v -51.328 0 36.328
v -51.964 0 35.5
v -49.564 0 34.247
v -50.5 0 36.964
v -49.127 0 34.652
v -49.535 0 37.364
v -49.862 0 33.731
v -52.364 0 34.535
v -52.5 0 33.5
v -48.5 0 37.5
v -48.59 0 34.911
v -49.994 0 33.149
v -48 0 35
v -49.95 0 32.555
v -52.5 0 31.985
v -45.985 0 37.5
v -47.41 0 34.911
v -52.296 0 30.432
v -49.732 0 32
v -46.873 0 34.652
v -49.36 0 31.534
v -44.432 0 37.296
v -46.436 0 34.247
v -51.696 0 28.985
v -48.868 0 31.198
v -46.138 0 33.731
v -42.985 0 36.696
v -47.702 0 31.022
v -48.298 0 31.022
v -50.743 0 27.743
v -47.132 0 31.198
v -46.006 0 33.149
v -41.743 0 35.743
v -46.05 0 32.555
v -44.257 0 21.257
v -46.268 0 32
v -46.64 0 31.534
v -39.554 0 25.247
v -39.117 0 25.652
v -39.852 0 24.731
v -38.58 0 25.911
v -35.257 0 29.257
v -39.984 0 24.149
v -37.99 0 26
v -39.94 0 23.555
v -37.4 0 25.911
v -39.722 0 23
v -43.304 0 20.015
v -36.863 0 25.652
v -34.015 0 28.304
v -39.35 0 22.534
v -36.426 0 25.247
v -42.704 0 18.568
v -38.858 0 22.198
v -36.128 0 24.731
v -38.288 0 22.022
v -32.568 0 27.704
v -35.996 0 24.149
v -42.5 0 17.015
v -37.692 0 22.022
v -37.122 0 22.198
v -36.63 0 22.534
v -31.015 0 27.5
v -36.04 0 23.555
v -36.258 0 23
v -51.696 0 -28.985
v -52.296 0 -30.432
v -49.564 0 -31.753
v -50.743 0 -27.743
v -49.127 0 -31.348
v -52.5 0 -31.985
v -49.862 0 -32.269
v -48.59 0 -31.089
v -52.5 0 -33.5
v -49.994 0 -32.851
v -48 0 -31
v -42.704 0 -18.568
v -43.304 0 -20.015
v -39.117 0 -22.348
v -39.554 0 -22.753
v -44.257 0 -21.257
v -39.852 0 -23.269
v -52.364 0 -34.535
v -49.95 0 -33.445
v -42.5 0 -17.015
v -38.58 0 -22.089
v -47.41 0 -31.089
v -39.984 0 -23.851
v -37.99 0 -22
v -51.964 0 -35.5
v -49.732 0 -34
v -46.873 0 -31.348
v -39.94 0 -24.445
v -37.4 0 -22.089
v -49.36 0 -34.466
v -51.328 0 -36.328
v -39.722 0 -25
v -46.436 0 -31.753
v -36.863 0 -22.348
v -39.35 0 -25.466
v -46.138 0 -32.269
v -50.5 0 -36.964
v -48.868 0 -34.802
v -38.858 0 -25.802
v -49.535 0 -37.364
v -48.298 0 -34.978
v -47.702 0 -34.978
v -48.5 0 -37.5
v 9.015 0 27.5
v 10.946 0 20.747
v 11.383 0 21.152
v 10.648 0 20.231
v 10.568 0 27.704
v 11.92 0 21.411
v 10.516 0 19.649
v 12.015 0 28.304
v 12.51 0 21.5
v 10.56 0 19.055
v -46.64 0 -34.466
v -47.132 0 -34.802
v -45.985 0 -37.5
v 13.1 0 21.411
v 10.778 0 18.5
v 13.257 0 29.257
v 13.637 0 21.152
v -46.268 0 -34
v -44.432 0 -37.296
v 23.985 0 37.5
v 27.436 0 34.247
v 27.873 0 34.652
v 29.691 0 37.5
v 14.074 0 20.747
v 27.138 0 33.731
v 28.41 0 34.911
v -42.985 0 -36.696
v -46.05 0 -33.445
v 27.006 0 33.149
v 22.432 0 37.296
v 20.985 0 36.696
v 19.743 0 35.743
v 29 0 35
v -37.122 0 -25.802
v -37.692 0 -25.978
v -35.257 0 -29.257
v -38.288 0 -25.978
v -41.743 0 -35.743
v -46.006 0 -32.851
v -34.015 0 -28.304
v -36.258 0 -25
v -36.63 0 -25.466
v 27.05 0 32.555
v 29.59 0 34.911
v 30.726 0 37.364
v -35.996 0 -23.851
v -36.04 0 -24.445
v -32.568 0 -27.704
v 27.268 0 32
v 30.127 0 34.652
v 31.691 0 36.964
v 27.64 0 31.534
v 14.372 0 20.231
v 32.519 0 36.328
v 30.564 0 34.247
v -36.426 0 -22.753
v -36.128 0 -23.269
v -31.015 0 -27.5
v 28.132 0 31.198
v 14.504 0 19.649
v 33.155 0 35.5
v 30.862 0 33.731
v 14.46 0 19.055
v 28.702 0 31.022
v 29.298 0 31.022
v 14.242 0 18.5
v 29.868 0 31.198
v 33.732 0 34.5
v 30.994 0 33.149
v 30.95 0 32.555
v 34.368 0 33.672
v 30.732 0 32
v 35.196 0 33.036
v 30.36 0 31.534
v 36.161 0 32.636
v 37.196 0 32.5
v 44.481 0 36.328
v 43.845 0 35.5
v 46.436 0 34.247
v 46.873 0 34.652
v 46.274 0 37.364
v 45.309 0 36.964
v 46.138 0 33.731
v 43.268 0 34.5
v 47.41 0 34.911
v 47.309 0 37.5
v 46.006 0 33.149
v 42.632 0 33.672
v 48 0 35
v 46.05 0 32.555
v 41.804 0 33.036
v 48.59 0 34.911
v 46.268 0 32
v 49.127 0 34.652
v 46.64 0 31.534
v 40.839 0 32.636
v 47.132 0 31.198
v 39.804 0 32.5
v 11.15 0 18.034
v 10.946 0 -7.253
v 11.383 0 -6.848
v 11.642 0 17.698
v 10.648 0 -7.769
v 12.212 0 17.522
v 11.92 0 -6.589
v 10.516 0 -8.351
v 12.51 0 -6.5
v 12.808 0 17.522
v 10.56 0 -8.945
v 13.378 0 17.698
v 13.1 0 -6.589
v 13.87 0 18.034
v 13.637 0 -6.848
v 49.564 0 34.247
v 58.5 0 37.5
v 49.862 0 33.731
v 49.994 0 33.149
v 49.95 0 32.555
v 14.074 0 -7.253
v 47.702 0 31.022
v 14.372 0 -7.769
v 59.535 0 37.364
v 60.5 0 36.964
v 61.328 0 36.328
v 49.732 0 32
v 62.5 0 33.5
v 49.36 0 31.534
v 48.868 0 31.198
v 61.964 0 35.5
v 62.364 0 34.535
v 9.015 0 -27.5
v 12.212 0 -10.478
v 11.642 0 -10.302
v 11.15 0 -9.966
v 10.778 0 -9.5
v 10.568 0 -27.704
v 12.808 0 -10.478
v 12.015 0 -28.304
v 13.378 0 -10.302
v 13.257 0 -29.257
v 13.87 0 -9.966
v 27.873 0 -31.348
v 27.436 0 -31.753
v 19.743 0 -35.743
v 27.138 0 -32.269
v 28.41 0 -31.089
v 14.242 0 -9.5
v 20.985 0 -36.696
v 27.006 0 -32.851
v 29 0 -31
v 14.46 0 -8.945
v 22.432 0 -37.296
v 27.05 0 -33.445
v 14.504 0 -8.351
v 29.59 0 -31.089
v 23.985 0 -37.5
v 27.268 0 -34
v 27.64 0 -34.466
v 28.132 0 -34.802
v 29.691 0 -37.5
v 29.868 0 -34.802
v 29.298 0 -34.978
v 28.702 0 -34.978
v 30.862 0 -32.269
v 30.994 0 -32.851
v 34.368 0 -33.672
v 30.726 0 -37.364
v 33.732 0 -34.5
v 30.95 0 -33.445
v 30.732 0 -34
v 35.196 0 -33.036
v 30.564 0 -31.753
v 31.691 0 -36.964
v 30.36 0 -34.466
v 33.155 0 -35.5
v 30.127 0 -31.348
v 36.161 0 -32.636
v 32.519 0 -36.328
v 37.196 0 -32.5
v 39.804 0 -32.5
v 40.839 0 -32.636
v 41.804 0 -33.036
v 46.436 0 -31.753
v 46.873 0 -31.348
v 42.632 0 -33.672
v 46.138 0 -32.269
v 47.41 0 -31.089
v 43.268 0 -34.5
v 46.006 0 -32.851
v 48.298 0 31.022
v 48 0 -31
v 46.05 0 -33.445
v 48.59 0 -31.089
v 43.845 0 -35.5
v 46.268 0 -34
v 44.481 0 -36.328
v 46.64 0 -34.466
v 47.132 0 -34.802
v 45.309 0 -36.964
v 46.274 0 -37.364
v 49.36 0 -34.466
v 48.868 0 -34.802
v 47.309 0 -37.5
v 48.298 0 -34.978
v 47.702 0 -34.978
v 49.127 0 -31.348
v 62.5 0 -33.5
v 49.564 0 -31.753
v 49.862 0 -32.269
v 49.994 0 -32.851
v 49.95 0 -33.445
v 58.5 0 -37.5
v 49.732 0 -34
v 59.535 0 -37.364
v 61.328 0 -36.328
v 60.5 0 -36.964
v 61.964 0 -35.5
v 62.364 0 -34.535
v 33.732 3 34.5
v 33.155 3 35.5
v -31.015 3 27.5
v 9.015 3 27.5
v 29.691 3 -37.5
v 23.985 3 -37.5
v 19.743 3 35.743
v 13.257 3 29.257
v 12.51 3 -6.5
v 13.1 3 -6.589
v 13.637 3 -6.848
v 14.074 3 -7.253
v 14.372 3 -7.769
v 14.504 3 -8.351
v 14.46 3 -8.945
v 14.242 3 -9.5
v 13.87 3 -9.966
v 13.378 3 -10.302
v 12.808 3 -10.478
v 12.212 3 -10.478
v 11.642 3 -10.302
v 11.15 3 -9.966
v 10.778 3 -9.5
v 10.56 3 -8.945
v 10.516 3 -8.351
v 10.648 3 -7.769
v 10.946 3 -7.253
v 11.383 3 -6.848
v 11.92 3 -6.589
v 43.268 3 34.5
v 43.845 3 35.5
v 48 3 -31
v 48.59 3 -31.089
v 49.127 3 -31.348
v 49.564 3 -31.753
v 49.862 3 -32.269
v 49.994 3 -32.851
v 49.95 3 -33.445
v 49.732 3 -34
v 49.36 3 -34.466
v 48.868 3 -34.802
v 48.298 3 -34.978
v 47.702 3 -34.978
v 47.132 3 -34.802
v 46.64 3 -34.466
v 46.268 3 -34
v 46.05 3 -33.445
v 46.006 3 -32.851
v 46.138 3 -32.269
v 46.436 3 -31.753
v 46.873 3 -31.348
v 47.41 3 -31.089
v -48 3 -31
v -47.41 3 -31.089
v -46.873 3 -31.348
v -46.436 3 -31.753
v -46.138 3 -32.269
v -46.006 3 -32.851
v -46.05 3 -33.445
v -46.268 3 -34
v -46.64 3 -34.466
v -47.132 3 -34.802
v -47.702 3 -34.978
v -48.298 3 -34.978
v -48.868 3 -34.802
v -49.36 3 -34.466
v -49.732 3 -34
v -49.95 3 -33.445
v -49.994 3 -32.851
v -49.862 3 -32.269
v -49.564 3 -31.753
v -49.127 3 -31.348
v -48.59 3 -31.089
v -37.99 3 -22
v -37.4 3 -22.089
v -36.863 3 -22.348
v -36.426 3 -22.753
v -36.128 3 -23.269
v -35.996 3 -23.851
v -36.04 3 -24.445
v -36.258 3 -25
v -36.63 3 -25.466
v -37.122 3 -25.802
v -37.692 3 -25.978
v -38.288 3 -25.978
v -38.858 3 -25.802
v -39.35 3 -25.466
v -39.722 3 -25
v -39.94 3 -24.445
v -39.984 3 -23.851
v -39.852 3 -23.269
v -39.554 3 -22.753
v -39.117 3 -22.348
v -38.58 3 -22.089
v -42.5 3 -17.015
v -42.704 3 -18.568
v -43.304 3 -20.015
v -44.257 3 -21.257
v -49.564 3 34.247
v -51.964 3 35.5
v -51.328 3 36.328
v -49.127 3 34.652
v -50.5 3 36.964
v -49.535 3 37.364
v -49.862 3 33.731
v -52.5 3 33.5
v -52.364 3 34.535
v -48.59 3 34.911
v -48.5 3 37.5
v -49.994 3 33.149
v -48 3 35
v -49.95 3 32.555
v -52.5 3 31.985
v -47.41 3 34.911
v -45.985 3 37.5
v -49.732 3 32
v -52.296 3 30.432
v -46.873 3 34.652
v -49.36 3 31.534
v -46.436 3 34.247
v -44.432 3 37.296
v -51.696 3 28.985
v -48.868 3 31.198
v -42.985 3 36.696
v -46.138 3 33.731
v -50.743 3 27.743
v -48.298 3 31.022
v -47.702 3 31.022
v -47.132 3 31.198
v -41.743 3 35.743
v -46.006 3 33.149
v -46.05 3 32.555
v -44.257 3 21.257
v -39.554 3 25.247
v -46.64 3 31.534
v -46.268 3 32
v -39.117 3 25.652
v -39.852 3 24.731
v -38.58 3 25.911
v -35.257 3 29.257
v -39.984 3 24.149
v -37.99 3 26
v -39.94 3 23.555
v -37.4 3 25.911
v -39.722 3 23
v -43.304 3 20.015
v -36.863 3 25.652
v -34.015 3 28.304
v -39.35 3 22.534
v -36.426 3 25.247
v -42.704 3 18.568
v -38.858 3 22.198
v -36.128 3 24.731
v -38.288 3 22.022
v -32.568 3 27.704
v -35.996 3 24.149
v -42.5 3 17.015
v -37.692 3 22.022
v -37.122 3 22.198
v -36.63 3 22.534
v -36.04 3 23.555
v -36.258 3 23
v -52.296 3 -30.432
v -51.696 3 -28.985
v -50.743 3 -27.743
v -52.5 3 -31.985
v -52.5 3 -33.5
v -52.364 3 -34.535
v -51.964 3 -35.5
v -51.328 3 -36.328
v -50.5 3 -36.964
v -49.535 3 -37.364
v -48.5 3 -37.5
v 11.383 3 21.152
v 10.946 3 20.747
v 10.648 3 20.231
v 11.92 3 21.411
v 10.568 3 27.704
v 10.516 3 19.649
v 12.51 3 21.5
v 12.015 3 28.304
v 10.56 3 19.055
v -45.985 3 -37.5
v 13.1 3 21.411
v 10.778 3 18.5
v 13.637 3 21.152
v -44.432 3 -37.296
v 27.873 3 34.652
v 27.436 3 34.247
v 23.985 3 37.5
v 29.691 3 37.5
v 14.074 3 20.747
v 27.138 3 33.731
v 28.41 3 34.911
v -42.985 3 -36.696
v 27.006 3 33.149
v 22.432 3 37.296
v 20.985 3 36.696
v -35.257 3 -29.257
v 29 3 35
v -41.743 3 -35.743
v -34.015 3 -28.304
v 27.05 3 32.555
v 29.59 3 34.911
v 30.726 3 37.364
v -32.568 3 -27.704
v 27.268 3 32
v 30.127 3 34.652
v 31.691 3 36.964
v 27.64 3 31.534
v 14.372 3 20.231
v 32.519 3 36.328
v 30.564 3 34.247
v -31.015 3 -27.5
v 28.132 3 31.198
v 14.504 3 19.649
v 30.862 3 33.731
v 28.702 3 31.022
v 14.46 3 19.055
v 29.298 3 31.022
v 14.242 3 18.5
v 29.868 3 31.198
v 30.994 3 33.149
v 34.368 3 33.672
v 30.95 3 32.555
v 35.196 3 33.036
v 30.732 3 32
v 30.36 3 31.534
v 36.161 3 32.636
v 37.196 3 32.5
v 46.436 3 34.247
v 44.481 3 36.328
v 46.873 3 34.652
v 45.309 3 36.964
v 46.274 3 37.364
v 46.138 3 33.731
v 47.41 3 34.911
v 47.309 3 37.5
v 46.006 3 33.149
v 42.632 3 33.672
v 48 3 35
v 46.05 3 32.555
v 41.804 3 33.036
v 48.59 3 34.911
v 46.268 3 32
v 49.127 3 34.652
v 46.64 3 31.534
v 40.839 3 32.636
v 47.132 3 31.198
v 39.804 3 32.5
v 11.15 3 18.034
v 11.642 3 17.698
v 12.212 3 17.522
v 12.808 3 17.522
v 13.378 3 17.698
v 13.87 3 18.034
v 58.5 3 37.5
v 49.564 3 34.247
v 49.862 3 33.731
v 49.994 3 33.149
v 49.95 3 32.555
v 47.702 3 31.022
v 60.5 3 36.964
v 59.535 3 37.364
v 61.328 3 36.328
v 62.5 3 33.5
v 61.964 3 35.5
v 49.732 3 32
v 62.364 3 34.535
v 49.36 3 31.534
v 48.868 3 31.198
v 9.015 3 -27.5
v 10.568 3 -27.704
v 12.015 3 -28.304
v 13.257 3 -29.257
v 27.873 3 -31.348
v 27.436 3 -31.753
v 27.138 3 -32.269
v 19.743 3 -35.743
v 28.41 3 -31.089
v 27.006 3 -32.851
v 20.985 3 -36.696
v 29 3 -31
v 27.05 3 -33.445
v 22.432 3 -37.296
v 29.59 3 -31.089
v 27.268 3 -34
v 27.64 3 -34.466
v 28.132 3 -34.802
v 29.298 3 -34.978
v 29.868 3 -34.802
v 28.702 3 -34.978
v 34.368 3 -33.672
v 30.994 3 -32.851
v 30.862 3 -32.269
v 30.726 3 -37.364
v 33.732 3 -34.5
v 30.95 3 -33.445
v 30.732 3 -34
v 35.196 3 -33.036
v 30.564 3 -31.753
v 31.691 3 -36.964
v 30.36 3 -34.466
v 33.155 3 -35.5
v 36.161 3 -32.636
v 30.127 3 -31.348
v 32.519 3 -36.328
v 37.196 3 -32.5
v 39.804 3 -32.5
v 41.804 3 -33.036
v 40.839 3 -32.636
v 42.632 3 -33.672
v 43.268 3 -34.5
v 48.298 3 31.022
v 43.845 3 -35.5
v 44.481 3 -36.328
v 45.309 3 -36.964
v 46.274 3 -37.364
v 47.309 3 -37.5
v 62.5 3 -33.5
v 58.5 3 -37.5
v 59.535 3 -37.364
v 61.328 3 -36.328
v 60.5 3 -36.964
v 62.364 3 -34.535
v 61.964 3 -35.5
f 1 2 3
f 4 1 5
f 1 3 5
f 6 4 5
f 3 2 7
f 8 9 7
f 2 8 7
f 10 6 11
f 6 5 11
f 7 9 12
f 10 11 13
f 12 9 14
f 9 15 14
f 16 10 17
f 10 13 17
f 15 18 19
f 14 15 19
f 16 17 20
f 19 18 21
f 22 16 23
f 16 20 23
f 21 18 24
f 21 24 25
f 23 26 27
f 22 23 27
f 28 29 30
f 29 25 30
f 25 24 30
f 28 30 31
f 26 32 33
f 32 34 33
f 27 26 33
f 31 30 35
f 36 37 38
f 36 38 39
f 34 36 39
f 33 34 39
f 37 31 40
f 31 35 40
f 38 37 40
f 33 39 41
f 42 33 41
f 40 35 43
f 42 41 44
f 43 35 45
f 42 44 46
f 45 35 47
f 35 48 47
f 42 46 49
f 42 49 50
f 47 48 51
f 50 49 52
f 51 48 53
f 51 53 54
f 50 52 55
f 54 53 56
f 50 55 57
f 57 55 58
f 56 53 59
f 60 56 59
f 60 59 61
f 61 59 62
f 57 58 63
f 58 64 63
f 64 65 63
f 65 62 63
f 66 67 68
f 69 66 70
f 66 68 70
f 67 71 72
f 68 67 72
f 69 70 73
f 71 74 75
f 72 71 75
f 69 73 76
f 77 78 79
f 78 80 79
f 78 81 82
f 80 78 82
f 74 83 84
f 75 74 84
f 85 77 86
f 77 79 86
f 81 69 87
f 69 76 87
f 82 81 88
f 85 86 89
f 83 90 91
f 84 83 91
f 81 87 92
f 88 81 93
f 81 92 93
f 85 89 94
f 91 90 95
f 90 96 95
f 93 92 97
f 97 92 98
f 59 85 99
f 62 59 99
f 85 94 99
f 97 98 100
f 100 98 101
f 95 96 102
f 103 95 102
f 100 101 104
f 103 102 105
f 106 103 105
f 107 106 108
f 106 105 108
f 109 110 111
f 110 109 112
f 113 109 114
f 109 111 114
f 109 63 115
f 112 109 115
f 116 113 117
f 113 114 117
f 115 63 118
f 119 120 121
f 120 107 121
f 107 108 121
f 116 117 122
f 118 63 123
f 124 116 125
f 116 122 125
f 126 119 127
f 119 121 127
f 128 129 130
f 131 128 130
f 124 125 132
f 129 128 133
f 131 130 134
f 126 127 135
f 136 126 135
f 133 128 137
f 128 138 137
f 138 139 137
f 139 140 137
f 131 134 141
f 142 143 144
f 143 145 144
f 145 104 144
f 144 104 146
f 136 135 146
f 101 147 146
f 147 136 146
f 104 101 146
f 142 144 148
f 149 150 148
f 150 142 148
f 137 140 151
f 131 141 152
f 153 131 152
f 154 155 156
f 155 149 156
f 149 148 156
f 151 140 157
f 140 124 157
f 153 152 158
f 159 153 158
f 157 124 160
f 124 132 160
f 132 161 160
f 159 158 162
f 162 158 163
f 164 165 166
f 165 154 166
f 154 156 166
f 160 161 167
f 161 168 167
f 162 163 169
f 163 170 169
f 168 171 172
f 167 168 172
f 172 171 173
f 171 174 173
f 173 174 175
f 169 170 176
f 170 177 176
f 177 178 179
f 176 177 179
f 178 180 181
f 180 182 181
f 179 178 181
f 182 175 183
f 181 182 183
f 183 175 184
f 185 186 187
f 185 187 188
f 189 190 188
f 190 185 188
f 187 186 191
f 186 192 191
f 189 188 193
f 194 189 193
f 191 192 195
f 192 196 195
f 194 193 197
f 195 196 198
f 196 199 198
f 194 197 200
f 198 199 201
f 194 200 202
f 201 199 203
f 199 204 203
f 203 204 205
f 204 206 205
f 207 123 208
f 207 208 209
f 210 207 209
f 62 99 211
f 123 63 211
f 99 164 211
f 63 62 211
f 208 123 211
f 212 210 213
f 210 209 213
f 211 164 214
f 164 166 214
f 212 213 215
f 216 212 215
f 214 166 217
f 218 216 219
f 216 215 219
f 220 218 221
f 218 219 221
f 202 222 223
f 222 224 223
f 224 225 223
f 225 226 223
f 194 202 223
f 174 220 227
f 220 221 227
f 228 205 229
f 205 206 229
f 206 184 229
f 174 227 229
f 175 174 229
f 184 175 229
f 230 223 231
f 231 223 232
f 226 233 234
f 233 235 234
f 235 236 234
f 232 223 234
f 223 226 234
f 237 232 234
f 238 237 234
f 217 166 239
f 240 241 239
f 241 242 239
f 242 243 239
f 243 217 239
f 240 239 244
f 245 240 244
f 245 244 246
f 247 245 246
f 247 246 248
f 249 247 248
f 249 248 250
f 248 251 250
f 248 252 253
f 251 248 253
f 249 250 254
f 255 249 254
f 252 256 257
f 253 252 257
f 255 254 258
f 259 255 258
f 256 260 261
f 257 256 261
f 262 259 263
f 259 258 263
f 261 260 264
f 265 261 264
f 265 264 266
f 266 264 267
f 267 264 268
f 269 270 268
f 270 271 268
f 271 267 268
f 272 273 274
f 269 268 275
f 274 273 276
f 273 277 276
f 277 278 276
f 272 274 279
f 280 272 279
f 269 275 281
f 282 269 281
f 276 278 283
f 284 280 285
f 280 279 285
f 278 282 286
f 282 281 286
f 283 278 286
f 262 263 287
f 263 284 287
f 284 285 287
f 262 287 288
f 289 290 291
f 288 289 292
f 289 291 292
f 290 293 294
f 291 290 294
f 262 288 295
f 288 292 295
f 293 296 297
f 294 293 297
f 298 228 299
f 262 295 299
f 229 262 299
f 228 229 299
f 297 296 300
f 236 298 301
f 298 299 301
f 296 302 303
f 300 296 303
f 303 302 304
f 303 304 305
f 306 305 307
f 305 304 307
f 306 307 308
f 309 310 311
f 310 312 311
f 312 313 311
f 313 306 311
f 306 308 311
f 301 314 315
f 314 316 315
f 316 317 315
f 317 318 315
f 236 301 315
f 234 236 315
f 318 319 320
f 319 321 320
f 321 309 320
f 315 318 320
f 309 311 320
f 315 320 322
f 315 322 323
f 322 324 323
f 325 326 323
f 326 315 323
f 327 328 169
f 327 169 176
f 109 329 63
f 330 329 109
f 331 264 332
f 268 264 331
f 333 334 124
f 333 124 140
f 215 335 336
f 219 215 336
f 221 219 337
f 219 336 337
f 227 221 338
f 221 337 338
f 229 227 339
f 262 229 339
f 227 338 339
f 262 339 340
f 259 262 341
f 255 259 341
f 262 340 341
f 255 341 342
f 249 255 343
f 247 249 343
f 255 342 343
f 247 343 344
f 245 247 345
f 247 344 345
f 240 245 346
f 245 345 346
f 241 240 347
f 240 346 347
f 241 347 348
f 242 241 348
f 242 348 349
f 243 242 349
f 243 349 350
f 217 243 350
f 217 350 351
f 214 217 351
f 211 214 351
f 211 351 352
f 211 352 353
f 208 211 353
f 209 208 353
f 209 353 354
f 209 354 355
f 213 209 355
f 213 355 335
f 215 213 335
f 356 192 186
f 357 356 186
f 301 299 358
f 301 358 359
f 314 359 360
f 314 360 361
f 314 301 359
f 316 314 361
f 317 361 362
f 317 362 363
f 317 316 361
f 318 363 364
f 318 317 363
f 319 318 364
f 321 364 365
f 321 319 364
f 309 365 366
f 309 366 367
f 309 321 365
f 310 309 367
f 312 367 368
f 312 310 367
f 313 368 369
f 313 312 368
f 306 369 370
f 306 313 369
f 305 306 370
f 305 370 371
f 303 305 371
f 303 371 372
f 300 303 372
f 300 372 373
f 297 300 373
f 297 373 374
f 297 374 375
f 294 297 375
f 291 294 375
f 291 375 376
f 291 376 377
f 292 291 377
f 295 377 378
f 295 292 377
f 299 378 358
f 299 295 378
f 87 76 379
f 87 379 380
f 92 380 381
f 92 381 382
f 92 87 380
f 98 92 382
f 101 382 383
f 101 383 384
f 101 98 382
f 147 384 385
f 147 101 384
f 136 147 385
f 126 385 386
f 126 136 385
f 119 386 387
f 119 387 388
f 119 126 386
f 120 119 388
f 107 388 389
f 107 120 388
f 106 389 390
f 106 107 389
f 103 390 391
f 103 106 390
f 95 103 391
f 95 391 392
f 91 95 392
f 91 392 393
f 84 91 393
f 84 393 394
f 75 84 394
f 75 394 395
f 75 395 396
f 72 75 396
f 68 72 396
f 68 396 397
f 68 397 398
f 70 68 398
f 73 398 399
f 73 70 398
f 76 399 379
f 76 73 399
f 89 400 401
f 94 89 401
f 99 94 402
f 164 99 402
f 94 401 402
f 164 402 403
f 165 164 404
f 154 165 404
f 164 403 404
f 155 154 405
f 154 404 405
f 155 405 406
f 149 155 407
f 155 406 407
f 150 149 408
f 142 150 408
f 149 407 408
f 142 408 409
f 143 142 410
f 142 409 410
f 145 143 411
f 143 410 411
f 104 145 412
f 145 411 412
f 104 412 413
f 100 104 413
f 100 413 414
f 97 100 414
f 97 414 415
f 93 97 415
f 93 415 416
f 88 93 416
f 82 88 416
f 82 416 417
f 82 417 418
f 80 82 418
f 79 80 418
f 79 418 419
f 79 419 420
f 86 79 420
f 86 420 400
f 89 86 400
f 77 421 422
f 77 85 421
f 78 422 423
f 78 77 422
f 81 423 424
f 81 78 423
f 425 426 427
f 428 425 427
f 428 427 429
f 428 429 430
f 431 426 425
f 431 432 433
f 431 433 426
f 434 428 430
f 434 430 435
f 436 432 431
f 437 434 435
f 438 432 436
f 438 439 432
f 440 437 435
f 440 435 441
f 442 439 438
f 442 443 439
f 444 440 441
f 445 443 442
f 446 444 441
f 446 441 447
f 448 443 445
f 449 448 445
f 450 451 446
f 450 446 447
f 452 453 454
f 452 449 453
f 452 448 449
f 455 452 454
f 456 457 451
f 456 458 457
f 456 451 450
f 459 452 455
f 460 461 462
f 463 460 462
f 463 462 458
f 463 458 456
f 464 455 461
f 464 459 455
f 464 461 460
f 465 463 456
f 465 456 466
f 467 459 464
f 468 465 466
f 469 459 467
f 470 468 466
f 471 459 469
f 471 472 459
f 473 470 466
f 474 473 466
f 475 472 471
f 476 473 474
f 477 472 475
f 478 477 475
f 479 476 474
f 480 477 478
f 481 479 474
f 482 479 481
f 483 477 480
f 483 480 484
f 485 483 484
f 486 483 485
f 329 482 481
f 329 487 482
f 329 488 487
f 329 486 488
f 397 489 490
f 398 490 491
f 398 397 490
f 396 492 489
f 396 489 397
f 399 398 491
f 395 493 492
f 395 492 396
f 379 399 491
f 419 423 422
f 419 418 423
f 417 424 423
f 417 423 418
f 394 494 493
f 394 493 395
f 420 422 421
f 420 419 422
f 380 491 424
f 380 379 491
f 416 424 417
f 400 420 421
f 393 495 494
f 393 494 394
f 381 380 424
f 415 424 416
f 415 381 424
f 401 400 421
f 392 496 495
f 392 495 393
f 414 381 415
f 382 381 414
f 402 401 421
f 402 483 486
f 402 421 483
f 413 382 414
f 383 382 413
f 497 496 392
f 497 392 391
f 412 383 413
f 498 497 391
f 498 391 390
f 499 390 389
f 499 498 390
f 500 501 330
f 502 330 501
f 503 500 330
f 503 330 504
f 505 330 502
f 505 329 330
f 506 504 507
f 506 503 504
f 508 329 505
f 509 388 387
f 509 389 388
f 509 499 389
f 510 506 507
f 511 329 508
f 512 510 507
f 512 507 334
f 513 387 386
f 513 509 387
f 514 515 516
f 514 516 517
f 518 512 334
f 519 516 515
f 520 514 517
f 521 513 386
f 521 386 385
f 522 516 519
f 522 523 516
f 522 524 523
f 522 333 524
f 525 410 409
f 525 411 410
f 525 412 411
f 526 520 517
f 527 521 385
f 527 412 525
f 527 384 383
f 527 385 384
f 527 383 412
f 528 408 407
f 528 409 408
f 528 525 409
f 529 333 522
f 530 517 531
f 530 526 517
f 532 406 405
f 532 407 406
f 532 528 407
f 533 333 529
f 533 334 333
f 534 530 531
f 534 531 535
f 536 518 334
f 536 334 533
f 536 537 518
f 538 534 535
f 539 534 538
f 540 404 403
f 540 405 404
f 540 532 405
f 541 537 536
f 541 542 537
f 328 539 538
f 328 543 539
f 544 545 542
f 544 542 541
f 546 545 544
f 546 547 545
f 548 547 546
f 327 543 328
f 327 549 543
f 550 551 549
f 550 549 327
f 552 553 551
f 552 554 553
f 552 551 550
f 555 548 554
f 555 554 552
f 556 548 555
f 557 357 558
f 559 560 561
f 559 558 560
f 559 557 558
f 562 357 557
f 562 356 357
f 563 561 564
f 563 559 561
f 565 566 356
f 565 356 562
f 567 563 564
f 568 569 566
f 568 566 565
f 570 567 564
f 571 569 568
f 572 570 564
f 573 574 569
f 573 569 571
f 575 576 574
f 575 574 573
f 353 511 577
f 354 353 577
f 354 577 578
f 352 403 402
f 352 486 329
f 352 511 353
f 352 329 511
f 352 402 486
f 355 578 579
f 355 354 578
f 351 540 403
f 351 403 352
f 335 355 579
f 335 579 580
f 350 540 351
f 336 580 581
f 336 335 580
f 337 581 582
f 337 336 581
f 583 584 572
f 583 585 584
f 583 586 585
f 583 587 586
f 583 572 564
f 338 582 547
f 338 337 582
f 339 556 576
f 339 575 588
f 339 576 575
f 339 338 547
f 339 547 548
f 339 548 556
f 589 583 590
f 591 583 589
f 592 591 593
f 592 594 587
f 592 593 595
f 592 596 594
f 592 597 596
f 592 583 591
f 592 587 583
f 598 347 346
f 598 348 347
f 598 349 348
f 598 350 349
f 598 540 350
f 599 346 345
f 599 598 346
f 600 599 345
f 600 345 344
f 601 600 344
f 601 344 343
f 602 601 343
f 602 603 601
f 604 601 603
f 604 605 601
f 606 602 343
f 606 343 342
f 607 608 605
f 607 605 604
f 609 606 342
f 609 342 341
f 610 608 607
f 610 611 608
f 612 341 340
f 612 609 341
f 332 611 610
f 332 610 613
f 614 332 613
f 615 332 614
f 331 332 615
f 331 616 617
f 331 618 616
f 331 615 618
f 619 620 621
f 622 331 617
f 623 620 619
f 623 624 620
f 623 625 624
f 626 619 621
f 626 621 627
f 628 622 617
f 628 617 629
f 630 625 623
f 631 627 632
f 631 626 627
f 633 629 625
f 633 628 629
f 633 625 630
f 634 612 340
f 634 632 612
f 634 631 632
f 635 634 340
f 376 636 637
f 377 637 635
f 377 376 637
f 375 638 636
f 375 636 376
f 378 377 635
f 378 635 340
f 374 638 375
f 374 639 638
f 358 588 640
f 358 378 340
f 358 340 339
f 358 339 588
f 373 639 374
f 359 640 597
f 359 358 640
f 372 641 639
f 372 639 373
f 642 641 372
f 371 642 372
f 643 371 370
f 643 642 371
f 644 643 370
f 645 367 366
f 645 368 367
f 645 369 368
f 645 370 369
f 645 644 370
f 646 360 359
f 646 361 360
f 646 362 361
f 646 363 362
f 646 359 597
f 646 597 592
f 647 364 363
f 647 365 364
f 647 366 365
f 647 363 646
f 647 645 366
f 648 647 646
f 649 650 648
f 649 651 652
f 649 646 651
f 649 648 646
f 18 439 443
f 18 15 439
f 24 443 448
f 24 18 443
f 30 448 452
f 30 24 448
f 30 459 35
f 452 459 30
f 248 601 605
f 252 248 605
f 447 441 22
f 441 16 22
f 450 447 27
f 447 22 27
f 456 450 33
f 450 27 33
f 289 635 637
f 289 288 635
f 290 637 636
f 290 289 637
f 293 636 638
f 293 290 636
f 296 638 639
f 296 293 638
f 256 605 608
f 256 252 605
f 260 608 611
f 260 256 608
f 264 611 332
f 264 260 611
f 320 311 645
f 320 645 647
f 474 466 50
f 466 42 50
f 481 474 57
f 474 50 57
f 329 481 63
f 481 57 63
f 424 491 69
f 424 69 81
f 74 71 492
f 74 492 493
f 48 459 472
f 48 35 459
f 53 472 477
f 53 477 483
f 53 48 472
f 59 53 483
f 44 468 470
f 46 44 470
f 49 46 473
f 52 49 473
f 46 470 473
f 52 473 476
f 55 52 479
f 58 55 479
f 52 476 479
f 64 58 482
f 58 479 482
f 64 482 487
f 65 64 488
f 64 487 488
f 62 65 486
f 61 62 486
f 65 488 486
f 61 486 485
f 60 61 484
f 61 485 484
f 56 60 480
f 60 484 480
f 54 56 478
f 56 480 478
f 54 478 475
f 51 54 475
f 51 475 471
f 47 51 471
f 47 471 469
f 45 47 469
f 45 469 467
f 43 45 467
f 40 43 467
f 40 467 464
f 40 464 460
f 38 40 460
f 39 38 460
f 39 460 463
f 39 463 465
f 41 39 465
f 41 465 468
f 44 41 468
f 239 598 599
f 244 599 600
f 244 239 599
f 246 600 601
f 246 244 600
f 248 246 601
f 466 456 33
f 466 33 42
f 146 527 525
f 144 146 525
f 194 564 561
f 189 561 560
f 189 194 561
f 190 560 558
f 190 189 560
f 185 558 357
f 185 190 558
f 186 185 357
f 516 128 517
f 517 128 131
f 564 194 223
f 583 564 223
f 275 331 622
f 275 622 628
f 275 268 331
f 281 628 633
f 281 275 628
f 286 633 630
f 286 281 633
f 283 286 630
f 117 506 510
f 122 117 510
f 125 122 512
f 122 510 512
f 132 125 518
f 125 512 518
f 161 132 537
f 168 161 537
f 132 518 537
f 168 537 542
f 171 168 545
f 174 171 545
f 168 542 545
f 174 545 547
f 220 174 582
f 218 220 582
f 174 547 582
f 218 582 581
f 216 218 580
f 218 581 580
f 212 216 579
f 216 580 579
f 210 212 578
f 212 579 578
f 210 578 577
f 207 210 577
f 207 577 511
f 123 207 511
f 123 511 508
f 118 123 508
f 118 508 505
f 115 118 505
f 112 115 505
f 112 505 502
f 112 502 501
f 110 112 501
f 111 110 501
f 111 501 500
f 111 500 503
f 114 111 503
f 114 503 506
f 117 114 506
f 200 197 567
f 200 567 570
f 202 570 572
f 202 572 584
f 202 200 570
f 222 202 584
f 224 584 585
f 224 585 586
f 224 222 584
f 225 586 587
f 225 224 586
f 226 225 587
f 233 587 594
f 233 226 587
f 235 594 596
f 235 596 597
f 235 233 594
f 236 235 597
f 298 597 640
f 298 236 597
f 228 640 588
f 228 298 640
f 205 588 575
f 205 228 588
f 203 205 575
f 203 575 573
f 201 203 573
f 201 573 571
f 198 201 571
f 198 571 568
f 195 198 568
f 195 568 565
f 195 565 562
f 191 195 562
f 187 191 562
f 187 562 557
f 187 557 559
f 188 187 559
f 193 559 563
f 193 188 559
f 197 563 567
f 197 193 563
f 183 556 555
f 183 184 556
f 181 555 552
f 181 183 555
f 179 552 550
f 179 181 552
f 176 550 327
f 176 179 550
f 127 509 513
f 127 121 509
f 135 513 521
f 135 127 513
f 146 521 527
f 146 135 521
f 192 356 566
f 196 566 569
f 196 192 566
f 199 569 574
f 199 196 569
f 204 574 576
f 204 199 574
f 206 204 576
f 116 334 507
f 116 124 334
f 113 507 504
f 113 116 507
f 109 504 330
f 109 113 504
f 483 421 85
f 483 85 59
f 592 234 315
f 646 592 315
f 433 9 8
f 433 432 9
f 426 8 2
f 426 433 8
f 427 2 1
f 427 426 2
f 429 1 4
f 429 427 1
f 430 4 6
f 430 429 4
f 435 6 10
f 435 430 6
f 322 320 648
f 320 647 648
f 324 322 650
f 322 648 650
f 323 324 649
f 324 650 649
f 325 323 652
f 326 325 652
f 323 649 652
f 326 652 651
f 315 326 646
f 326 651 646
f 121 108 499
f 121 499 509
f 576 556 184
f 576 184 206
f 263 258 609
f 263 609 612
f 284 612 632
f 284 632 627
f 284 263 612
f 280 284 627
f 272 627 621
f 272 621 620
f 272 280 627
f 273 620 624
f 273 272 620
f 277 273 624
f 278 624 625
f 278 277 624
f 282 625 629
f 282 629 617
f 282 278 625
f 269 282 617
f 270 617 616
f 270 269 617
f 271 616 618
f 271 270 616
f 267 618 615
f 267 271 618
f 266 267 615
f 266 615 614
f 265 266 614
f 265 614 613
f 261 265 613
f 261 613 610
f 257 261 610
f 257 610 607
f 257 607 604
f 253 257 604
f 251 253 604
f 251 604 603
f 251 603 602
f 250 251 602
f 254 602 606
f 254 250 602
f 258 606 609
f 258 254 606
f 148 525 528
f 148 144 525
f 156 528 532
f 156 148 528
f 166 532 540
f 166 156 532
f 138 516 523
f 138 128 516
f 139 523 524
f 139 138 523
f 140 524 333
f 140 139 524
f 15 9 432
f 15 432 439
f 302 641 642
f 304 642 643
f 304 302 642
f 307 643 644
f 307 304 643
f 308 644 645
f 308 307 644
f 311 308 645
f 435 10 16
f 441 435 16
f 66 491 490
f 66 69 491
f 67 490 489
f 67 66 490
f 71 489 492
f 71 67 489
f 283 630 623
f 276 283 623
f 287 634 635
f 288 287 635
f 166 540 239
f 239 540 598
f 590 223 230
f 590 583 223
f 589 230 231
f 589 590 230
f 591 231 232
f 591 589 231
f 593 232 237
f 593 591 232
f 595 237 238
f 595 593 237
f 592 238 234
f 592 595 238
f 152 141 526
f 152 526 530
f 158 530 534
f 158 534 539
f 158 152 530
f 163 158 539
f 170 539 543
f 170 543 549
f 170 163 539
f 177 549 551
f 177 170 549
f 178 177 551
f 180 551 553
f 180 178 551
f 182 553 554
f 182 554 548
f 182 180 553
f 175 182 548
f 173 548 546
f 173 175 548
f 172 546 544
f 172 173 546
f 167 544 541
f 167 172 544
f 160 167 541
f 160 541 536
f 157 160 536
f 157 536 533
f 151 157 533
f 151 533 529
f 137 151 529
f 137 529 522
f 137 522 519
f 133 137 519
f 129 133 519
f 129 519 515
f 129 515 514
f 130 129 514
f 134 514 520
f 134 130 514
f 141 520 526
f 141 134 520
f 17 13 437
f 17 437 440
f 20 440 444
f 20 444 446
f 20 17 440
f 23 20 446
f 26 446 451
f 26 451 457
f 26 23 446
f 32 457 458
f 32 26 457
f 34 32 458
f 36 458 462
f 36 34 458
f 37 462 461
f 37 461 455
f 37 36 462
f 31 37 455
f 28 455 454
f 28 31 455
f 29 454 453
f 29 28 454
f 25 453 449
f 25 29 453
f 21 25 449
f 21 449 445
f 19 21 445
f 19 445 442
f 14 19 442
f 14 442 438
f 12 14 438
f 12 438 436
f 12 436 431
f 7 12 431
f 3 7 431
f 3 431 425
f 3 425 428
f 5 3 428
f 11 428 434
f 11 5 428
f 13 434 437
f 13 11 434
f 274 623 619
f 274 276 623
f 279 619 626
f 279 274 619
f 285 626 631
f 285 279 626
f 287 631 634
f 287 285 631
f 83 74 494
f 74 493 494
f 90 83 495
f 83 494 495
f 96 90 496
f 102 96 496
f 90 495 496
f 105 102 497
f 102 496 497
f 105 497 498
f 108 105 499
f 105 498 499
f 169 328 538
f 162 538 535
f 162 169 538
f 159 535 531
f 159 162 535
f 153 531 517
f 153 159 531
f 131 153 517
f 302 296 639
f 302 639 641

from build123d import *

# Parameters (mm, degrees)
SKETCH_1_W          = 105
SKETCH_1_H          = 75
SKETCH_1_R          = 2
EXTRUDE_1_DEPTH     = 3
SKETCH_3_R          = 2
CUT_EXTRUDE_2_DEPTH = 30.8
SKETCH_6_R          = 2
CUT_EXTRUDE_4_DEPTH = 15
FILLET_1_R          = 4
SKETCH_7_W          = 10
SKETCH_7_H          = 75
EXTRUDE_2_DEPTH     = 3
FILLET_2_R          = 4
CUT_EXTRUDE_START   = -3
SKETCH_8_R          = 2
CUT_EXTRUDE_5_DEPTH = 3
CUT_EXTRUDE_6_DEPTH = 10
FILLET_3_R          = 6
CUT_EXTRUDE_7_DEPTH = 10
FILLET_4_R          = 4


with BuildPart() as part:
    # 스케치1 → 보스-돌출1 (new body)
    with BuildSketch(Plane(origin=(0, 0, 0), x_dir=(1, 0, 0), z_dir=(0, 1, 0))):
        Rectangle(SKETCH_1_W, SKETCH_1_H)
        with Locations((48, 33)):
            Circle(SKETCH_1_R, mode=Mode.SUBTRACT)
        with Locations((-48, 33)):
            Circle(SKETCH_1_R, mode=Mode.SUBTRACT)
        with Locations((-48, -33)):
            Circle(SKETCH_1_R, mode=Mode.SUBTRACT)
        with Locations((48, -33)):
            Circle(SKETCH_1_R, mode=Mode.SUBTRACT)
    extrude(amount=EXTRUDE_1_DEPTH)

    # 스케치3 → 컷-돌출2 (cut)
    with BuildSketch(Plane(origin=(0, 3, 0), x_dir=(1, 0, 0), z_dir=(0, 1, 0))):
        with Locations((-37.99, 24)):
            Circle(SKETCH_3_R)
    extrude(amount=-CUT_EXTRUDE_2_DEPTH, mode=Mode.SUBTRACT)

    # 스케치6 → 컷-돌출4 (cut)
    with BuildSketch(Plane(origin=(0, 3, 0), x_dir=(1, 0, 0), z_dir=(0, 1, 0))):
        with Locations((-37.99, -24)):
            Circle(SKETCH_6_R)
        with Locations((12.51, 8.5)):
            Circle(SKETCH_6_R)
        with Locations((12.51, -19.5)):
            Circle(SKETCH_6_R)
    extrude(amount=-CUT_EXTRUDE_4_DEPTH, mode=Mode.SUBTRACT)

    # 필렛1
    fillet_1_edges = [part.edges().sort_by_distance(p)[0] for p in [
        (-52.5, 1.5, 37.5),
        (-52.5, 1.5, -37.5),
    ]]
    fillet(fillet_1_edges, radius=FILLET_1_R)

    # 스케치7 → 보스-돌출2 (add)
    with BuildSketch(Plane(origin=(0, 0, 0), x_dir=(1, 0, 0), z_dir=(0, 1, 0))):
        with Locations((57.5, 0)):
            Rectangle(SKETCH_7_W, SKETCH_7_H)
    extrude(amount=EXTRUDE_2_DEPTH)

    # 필렛2
    fillet_2_edges = [part.edges().sort_by_distance(p)[0] for p in [
        (62.5, 1.5, -37.5),
        (62.5, 1.5, 37.5),
    ]]
    fillet(fillet_2_edges, radius=FILLET_2_R)

    # 스케치8 → 컷-돌출5 (cut)
    with BuildSketch(Plane(origin=(0, 3, 0), x_dir=(1, 0, 0), z_dir=(0, 1, 0)).offset(CUT_EXTRUDE_START)):
        with Locations((29, -33)):
            Circle(SKETCH_8_R)
        with Locations((29, 33)):
            Circle(SKETCH_8_R)
        with Locations((48, -33)):
            Circle(SKETCH_8_R)
        with Locations((48, 33)):
            Circle(SKETCH_8_R)
    extrude(amount=CUT_EXTRUDE_5_DEPTH, mode=Mode.SUBTRACT)

    # 스케치9 → 컷-돌출6 (cut)
    with BuildSketch(Plane(origin=(0, 3, 0), x_dir=(1, 0, 0), z_dir=(0, 1, 0))):
        Polygon((-52.5, 29.5), (-42.5, 19.5), (-42.5, -19.5), (-52.5, -29.5), align=None)
        Polygon((-43.5, -37.5), (-33.5, -27.5), (11.5, -27.5), (21.5, -37.5), align=None)
        Polygon((-43.5, 37.5), (-33.5, 27.5), (11.5, 27.5), (21.5, 37.5), align=None)
    extrude(amount=-CUT_EXTRUDE_6_DEPTH, mode=Mode.SUBTRACT)

    # 필렛3
    fillet_3_edges = [part.edges().sort_by_distance(p)[0] for p in [
        (11.5, 1.5, -27.5),
        (21.5, 1.5, -37.5),
        (-33.5, 1.5, -27.5),
        (-43.5, 1.5, -37.5),
        (21.5, 1.5, 37.5),
        (11.5, 1.5, 27.5),
        (-43.5, 1.5, 37.5),
        (-33.5, 1.5, 27.5),
        (-52.5, 1.5, 29.5),
        (-42.5, 1.5, 19.5),
        (-42.5, 1.5, -19.5),
        (-52.5, 1.5, -29.5),
    ]]
    fillet(fillet_3_edges, radius=FILLET_3_R)

    # 스케치10 → 컷-돌출7 (cut)
    with BuildSketch(Plane(origin=(0, 3, 0), x_dir=(1, 0, 0), z_dir=(0, 1, 0))):
        Polygon((32, -37.5), (34.886751346, -32.5), (42.113248654, -32.5), (45, -37.5), align=None)
        Polygon((32, 37.5), (34.886751346, 32.5), (42.113248654, 32.5), (45, 37.5), align=None)
    extrude(amount=-CUT_EXTRUDE_7_DEPTH, mode=Mode.SUBTRACT)

    # 필렛4
    fillet_4_edges = [part.edges().sort_by_distance(p)[0] for p in [
        (45, 1.5, -37.5),
        (42.113248654, 1.5, -32.5),
        (32, 1.5, -37.5),
        (34.886751346, 1.5, -32.5),
        (45, 1.5, 37.5),
        (42.113248654, 1.5, 32.5),
        (34.886751346, 1.5, 32.5),
        (32, 1.5, 37.5),
    ]]
    fillet(fillet_4_edges, radius=FILLET_4_R)


solid = part.part
